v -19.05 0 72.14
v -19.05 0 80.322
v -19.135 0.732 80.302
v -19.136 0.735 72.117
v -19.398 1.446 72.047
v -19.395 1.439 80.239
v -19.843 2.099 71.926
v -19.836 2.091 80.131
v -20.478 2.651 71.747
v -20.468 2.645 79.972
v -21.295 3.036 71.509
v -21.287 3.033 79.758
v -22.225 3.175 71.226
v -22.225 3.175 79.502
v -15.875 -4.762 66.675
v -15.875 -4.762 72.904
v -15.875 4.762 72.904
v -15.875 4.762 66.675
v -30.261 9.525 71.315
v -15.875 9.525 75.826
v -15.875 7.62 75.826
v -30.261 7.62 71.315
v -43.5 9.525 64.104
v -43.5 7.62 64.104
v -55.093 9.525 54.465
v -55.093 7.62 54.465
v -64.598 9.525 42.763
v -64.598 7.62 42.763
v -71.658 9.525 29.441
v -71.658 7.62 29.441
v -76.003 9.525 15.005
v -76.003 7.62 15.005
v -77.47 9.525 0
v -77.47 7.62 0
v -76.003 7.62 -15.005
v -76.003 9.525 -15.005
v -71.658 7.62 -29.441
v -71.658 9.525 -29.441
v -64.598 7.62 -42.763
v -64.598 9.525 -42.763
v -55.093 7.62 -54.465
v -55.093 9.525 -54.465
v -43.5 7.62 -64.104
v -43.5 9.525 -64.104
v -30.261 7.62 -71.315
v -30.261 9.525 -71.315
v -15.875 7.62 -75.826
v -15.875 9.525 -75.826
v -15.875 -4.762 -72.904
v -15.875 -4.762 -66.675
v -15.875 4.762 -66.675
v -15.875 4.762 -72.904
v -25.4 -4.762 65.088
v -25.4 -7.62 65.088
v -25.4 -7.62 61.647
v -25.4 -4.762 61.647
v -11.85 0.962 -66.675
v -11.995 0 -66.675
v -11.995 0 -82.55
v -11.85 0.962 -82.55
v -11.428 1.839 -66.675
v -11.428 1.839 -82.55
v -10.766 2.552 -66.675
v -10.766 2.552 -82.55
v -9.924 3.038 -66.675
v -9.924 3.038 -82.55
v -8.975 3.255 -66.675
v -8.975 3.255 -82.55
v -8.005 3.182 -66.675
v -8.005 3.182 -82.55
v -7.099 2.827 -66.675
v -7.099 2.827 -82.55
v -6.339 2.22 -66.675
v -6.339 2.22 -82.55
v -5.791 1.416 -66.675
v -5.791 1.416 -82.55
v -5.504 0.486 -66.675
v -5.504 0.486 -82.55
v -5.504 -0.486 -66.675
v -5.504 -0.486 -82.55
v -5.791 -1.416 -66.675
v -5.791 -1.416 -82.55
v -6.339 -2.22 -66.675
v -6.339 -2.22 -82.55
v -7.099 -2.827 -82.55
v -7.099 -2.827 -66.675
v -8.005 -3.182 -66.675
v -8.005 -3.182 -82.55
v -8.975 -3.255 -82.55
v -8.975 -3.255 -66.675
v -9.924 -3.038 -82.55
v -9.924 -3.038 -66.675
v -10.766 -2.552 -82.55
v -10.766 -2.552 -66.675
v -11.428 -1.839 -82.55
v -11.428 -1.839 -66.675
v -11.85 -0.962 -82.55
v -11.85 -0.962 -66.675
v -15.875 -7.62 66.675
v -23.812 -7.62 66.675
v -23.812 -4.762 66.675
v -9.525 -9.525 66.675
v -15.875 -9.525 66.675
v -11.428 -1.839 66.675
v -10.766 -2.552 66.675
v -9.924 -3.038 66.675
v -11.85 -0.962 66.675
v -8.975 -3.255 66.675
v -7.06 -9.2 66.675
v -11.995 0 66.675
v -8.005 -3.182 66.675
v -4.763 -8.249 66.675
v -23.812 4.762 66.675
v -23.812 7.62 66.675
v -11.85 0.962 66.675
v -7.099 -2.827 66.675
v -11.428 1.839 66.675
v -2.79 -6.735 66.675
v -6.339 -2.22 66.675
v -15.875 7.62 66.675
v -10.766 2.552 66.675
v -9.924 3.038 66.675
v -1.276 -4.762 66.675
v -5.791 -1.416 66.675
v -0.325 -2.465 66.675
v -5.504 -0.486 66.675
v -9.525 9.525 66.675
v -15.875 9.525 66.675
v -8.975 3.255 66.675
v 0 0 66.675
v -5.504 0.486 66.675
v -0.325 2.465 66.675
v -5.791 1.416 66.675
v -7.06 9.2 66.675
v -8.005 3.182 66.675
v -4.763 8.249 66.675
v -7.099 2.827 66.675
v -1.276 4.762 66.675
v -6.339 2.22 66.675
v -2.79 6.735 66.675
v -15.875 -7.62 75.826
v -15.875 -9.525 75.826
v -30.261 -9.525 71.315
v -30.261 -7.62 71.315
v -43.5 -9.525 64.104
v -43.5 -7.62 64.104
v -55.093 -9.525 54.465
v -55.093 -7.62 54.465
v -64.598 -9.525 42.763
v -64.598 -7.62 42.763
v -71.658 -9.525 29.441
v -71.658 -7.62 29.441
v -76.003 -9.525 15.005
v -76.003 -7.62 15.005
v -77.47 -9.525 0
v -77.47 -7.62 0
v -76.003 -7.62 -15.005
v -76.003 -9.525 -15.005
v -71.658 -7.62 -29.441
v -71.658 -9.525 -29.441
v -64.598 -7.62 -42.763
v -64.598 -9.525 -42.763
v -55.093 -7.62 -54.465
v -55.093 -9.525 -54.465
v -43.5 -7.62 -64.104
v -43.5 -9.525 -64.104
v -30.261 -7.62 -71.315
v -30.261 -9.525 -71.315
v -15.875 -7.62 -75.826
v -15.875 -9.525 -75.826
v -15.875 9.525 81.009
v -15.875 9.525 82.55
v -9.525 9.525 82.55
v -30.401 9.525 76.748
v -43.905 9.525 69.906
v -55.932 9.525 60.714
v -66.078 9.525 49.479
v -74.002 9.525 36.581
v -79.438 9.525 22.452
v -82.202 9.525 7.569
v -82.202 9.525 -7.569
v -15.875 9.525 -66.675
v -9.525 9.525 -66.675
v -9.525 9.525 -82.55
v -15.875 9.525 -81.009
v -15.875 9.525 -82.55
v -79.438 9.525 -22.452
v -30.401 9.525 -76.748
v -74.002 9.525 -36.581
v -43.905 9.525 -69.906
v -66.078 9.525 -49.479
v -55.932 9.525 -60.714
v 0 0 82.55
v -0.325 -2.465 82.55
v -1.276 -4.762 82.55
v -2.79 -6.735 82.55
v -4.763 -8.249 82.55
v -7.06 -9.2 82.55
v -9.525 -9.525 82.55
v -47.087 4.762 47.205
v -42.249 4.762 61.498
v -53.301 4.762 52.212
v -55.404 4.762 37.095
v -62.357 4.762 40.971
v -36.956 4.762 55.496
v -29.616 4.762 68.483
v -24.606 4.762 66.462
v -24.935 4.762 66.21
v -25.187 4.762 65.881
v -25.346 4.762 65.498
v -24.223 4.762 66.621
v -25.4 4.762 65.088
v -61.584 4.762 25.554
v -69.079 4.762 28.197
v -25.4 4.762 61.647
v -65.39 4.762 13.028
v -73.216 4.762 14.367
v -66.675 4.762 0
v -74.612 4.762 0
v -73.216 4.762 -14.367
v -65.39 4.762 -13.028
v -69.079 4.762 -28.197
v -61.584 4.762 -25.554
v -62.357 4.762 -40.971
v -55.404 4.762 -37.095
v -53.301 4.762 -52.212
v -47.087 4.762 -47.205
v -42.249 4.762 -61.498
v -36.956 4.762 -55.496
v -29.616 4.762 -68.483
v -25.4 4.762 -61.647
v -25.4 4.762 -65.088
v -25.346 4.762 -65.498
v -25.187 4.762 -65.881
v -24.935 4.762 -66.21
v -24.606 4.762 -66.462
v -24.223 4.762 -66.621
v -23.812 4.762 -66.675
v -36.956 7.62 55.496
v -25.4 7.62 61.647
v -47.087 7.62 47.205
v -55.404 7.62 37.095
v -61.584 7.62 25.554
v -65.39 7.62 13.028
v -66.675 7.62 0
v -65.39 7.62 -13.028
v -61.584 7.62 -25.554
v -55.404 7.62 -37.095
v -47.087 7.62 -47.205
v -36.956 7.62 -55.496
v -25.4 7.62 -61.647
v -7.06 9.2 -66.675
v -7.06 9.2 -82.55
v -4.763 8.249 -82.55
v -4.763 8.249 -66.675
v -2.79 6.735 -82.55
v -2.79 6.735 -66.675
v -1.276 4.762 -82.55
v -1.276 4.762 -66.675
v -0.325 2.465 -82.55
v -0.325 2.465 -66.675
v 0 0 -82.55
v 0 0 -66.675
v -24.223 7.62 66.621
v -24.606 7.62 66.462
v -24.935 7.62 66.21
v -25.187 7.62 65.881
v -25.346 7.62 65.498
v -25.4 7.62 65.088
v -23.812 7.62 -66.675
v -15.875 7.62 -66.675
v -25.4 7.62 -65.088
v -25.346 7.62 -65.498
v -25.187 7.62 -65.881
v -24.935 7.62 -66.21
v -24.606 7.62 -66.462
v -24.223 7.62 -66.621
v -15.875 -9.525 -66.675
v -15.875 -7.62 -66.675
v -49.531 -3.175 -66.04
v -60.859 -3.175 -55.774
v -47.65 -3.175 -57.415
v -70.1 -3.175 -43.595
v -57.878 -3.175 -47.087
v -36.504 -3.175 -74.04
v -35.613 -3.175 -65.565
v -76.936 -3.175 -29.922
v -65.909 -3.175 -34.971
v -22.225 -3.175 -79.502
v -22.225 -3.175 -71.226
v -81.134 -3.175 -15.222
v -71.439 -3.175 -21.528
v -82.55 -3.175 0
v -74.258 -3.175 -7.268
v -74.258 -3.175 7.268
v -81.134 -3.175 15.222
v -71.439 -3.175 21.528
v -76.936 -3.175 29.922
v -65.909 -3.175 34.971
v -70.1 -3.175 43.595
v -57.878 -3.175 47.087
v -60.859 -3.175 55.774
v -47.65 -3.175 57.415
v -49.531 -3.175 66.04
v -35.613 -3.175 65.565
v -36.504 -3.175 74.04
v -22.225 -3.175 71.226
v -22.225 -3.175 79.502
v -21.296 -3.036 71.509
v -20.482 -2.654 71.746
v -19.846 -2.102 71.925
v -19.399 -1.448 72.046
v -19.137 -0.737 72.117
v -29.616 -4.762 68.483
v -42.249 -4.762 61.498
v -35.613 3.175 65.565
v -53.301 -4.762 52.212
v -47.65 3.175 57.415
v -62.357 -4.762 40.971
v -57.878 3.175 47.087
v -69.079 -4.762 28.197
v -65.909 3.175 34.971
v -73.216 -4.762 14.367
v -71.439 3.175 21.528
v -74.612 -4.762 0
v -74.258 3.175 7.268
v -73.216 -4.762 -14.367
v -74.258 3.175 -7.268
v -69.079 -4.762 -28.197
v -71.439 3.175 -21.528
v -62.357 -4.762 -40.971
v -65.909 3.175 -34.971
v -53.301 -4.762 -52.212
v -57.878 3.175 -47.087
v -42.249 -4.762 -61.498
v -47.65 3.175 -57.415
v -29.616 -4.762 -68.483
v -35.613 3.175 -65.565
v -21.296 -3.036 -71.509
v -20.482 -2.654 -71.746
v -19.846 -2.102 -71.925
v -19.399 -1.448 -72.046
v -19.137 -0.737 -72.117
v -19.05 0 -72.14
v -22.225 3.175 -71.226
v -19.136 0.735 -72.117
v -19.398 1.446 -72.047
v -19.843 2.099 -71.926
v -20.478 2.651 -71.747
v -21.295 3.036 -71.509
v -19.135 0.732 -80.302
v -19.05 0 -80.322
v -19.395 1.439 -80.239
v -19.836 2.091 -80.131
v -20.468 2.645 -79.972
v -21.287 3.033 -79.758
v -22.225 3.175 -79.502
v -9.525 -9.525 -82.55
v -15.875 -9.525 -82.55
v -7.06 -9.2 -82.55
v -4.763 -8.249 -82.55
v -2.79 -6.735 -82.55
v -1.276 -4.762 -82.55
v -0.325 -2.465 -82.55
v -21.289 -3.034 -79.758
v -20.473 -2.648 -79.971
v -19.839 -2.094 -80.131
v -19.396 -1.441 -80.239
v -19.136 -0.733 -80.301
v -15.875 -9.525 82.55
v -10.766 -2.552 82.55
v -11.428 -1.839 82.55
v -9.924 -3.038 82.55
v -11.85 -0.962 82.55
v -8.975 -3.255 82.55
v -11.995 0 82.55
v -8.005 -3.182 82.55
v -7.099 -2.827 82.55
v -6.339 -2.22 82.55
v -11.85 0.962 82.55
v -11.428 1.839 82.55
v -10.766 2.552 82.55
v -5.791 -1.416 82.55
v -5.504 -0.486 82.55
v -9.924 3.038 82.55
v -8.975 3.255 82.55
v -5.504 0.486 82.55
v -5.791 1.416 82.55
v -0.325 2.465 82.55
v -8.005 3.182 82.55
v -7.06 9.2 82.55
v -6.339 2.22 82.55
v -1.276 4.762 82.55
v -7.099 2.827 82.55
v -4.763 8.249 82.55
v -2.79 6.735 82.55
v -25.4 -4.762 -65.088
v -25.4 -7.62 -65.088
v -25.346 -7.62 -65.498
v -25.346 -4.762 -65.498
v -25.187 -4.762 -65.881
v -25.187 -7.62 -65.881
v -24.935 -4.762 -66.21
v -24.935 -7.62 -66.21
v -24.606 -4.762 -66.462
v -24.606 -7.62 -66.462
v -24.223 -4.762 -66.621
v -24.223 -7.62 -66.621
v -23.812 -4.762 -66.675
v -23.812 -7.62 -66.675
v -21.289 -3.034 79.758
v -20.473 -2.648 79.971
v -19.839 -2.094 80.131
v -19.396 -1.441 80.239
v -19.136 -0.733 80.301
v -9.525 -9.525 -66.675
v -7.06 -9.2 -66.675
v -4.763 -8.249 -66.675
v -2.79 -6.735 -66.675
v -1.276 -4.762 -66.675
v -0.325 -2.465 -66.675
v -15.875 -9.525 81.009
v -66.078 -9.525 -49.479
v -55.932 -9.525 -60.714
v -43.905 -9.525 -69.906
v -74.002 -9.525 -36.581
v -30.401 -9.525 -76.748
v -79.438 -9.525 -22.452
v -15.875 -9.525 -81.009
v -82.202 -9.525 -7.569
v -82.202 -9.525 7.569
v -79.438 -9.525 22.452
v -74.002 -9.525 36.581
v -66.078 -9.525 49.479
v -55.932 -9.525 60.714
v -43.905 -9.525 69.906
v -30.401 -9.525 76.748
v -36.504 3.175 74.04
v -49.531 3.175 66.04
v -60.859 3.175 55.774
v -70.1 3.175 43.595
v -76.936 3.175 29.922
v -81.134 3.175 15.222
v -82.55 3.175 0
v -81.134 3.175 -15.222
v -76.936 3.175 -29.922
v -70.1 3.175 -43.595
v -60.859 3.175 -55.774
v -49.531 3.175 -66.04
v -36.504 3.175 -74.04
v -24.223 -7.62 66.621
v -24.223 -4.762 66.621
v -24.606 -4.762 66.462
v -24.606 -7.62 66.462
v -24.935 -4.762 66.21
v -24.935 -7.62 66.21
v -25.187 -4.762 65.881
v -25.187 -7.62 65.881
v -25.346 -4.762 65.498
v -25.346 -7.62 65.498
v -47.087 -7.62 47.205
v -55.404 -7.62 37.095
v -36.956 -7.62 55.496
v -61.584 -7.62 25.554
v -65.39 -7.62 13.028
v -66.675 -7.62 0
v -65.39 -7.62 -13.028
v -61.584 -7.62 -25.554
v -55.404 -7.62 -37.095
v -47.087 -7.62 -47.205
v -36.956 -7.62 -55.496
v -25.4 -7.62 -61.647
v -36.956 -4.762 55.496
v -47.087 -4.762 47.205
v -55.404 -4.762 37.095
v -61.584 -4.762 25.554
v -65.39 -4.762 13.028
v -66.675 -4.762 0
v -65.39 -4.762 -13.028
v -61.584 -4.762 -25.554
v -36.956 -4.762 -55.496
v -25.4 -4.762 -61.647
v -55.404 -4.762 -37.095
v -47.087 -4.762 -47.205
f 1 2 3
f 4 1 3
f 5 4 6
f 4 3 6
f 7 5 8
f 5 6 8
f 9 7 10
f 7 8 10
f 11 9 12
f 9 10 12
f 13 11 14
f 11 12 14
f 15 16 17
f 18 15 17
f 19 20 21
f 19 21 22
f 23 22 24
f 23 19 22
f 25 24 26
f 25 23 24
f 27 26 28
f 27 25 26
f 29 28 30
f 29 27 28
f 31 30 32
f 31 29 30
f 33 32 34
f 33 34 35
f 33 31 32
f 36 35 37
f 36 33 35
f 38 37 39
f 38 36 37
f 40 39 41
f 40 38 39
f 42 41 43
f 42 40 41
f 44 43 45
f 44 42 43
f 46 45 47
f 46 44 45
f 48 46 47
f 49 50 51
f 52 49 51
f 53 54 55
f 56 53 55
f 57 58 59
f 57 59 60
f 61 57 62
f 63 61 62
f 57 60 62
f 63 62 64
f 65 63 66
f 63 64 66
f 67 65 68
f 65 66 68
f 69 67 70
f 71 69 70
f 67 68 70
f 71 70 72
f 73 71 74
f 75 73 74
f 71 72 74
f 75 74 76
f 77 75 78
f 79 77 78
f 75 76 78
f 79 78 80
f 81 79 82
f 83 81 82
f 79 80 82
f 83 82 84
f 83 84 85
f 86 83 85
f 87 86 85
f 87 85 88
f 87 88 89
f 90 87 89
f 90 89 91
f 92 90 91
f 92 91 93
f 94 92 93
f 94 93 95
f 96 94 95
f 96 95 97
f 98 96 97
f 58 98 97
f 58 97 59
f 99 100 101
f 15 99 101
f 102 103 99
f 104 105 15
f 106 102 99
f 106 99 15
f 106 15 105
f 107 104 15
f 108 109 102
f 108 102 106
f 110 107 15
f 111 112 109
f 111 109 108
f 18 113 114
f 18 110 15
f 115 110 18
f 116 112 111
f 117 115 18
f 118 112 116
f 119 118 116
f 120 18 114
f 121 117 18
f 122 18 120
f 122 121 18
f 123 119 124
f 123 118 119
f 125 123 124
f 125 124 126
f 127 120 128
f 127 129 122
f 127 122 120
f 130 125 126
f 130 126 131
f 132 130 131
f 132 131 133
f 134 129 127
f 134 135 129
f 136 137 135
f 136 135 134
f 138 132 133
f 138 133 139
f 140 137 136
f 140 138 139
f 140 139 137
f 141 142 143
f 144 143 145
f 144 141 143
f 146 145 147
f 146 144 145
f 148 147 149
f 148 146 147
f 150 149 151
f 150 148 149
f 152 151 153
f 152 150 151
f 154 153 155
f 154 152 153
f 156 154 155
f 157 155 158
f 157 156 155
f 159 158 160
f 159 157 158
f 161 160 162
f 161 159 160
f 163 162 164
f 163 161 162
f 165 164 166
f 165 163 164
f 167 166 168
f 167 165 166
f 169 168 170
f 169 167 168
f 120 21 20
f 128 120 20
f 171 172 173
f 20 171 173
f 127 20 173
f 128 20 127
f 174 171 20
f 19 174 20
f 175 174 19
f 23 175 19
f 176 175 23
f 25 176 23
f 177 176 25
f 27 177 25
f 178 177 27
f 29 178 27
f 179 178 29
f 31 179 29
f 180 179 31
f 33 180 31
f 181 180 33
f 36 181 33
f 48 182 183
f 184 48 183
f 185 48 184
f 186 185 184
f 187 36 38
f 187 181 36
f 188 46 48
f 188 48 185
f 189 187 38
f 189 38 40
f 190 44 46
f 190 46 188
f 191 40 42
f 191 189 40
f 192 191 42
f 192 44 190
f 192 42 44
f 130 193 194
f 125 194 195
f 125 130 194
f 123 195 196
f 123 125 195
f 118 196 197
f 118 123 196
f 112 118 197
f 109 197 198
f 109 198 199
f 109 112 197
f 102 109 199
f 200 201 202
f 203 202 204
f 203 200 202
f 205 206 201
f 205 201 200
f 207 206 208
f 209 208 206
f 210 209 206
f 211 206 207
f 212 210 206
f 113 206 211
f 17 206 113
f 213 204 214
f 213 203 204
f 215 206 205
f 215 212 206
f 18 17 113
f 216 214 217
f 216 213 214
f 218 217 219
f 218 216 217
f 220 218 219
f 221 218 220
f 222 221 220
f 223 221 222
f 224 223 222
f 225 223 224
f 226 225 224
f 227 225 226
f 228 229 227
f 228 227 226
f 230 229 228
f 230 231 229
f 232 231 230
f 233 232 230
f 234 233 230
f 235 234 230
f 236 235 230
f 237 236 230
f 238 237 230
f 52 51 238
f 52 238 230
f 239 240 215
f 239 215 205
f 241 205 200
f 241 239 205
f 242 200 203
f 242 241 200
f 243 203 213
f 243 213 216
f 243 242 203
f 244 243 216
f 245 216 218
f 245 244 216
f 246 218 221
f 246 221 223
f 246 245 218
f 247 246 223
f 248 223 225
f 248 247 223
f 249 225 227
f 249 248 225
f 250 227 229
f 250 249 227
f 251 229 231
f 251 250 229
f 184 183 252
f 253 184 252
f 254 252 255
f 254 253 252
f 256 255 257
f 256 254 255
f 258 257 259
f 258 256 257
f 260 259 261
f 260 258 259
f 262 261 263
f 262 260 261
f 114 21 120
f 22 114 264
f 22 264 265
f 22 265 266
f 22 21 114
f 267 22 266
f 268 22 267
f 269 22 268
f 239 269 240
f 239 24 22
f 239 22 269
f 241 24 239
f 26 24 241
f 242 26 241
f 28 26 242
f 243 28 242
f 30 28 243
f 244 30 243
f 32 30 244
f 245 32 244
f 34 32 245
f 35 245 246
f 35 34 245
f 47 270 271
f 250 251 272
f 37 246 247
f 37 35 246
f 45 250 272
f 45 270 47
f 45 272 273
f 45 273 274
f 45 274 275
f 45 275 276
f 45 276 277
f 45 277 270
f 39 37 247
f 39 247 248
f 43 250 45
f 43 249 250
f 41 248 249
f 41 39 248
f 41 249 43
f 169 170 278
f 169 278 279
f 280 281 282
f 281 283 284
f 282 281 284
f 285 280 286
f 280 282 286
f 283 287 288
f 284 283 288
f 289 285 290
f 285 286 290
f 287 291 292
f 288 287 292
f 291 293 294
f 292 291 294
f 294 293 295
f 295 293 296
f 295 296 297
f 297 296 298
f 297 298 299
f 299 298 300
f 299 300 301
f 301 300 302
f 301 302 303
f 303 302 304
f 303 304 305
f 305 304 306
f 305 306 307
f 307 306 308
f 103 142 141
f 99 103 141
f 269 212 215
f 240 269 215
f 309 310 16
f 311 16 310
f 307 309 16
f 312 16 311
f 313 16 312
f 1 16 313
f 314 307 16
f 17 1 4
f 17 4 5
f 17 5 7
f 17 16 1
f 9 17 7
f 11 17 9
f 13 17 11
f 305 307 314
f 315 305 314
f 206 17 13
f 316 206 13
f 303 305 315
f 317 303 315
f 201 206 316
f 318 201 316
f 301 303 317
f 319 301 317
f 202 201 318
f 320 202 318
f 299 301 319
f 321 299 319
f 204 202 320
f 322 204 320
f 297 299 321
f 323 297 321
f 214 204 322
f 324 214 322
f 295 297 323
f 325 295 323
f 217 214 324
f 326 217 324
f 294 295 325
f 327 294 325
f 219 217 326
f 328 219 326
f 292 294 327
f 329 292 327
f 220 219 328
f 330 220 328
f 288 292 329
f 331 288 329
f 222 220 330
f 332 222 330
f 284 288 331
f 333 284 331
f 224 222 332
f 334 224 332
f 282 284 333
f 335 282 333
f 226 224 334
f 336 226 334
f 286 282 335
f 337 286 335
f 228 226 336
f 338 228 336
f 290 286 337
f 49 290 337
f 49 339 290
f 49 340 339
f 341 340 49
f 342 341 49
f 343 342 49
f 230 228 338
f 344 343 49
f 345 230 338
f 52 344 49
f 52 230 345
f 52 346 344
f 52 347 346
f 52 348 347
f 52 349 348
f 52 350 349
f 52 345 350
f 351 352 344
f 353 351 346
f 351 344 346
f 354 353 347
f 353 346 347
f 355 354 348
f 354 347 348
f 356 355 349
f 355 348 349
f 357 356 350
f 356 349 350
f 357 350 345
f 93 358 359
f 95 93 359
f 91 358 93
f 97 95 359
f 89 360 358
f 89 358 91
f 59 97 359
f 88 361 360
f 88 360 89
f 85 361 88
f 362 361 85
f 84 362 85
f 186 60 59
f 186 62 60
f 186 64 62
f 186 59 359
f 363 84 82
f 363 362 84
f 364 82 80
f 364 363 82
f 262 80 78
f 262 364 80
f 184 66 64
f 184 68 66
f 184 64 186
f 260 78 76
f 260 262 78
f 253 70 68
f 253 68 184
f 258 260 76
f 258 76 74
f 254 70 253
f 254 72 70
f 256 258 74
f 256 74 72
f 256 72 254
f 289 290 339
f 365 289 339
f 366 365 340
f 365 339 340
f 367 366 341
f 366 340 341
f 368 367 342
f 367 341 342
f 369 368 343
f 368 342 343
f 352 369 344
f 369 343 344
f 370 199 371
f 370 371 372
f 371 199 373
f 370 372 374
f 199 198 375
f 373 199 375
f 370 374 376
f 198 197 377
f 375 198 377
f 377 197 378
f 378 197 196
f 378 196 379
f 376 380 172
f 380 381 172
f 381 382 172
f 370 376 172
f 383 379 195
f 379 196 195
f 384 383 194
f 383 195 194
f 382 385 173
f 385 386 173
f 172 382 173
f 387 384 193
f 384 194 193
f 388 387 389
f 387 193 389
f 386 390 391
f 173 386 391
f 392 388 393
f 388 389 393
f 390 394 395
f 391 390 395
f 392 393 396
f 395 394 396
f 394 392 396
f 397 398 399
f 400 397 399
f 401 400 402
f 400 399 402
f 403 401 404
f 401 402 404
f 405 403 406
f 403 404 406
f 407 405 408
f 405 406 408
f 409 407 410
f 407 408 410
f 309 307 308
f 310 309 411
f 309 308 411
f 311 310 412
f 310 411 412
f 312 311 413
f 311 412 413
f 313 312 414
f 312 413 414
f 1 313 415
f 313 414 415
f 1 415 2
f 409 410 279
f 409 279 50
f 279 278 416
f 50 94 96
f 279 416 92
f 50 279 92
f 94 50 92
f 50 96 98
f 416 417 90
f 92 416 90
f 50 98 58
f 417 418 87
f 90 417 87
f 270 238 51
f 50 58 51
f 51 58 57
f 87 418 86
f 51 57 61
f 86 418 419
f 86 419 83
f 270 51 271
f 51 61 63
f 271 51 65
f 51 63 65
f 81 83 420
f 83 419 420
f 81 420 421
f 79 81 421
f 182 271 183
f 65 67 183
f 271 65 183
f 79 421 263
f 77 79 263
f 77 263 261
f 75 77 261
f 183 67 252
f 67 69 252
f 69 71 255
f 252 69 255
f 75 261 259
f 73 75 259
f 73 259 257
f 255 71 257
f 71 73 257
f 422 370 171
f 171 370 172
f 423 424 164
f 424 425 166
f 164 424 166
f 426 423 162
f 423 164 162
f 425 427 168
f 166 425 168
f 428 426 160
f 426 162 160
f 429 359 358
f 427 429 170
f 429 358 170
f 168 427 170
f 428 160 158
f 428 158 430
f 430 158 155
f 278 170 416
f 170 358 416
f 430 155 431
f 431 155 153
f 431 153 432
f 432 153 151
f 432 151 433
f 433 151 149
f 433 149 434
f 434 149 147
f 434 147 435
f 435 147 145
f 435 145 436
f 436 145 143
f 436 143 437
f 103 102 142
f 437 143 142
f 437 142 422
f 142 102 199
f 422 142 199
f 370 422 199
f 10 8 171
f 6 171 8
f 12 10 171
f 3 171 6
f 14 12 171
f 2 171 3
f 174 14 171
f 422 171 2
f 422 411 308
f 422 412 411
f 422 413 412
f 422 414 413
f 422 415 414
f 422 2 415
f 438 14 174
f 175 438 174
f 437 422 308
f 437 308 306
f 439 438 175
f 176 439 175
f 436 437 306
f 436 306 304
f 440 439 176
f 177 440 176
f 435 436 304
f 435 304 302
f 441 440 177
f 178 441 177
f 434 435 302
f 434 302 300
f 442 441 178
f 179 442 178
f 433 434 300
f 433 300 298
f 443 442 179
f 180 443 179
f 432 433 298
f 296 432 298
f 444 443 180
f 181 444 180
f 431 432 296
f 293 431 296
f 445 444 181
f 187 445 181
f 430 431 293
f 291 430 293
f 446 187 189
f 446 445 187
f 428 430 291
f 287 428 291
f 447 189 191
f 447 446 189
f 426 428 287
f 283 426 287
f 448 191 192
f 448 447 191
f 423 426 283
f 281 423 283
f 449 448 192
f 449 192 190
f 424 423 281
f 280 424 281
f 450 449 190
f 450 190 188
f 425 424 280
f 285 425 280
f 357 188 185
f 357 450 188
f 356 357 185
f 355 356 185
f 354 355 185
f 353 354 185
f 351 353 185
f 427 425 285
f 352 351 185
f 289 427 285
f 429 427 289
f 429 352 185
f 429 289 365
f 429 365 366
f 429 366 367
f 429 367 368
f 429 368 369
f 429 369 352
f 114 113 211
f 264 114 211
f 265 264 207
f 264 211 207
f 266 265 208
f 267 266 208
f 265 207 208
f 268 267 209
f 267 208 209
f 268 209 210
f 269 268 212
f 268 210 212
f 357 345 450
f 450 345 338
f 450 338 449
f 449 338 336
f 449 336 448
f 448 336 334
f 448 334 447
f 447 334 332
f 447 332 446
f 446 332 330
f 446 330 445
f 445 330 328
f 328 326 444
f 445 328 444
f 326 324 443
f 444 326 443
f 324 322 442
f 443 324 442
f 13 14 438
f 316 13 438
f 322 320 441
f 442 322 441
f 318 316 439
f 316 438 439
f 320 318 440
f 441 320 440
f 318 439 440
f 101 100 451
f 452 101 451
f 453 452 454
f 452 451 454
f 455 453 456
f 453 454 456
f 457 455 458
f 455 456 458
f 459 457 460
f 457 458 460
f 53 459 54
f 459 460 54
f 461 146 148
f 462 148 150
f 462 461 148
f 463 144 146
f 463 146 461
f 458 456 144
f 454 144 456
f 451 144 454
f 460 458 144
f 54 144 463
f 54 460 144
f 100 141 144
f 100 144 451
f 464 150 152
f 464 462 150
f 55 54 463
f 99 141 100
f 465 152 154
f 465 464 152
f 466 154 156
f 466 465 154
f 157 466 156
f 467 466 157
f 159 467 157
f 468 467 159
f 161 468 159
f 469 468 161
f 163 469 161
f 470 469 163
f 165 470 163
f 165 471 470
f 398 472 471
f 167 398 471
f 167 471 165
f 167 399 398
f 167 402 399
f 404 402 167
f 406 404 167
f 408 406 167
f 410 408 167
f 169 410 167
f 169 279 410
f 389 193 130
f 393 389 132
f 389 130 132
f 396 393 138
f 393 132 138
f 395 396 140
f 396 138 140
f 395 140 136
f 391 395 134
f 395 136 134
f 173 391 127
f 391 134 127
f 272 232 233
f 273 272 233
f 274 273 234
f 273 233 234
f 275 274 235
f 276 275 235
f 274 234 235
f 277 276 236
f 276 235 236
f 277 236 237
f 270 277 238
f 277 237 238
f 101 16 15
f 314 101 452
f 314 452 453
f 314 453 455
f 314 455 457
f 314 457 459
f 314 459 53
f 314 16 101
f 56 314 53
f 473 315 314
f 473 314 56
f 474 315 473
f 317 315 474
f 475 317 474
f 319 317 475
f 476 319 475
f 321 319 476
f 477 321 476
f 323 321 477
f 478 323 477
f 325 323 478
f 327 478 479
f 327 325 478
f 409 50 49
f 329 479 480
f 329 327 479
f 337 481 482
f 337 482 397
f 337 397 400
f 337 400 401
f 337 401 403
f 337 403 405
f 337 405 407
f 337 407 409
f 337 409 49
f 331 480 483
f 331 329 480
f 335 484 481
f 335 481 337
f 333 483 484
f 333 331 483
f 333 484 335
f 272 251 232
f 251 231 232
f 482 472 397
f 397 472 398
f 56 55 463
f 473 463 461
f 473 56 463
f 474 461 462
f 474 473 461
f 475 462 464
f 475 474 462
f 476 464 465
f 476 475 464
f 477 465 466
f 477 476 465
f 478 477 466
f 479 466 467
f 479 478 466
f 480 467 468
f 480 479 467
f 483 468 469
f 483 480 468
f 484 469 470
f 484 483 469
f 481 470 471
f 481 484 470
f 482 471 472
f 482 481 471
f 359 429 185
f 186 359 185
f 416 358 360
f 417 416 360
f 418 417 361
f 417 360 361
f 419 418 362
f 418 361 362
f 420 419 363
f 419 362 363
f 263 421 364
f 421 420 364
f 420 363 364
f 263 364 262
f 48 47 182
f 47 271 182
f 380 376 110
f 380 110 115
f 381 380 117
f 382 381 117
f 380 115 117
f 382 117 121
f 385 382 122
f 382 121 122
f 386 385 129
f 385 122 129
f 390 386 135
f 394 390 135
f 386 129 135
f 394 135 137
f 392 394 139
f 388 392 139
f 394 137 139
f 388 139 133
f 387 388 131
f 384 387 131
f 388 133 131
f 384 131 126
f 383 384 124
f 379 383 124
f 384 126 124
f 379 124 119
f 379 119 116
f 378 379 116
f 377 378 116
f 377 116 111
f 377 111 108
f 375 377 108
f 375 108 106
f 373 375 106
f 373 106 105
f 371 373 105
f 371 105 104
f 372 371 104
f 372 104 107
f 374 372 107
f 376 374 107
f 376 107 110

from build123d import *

# Parameters (mm, degrees)
F3_W        = 19.05
F3_H        = 15.875
F4_DEPTH    = 15.875
F6_D        = 6.5278
F8_DEPTH    = 165.101
F9_T1_DEPTH = 63.5
F9_T3_DEPTH = 63.5
F11_DEPTH   = 17.1460001


# Not quite as in the source:
# - a fillet or chamfer that OpenCascade refuses, or shapes differently, is made with other operations: its cross-section is extruded or revolved along the edge and cut away or added


with BuildPart() as f2:
    # F2: sweep along a path in F0
    with BuildLine(Plane.XZ) as f2_path:
        ThreePointArc((0, 76.2), (-76.2, 0), (0, -76.2))
    # F1 (on Right) → F2 (sweep)
    with BuildSketch(Plane.YZ):
        Polygon((9.525, 82.55), (0, 82.55), (-9.525, 82.55), (-9.525, 77.47), (-7.62, 77.47), (-7.62, 66.675), (-4.7625, 66.675), (-4.7625, 74.6125), (0, 74.6125), (4.7625, 74.6125), (4.7625, 66.675), (7.62, 66.675), (7.62, 77.47), (9.525, 77.47), align=None)
    sweep(path=f2_path.line)

    # F3 (on face) → F4 (join)
    with BuildSketch(Plane.YZ):
        with Locations((0, 74.6125)):
            Rectangle(F3_W, F3_H)
        with Locations((0, -74.6125)):
            Rectangle(F3_W, F3_H)
    extrude(amount=-F4_DEPTH)

    # F6 (through all)
    with Locations(Plane.XY.offset(82.55)):
        with Locations((-8.73125, 0)):
            Hole(F6_D / 2)

    # F7 (on face) → F8 (cut, through all)
    with BuildSketch(Plane.XY.offset(82.55)):
        with BuildLine():
            Line((-22.225, 3.175), (-114.3, 3.175))
            Line((-114.3, 3.175), (-114.3, -3.175))
            Line((-114.3, -3.175), (-22.225, -3.175))
            ThreePointArc((-22.225, -3.175), (-19.9799359697, -2.2450640303), (-19.05, 0))
            ThreePointArc((-19.05, 0), (-19.9799359697, 2.2450640303), (-22.225, 3.175))
        make_face()
    extrude(amount=-F8_DEPTH, mode=Mode.SUBTRACT)

    # F9: fillet of radius 9.525 on 4 edges, made by hand

    # F9_s2 → F9_t1 (cut)
    with BuildSketch(Plane.XY.offset(42.8625)):
        with BuildLine():
            ThreePointArc((0, 0), (-2.7898079092, -6.7351920908), (-9.525, -9.525))
            Line((-9.525, -9.525), (0, -9.525))
            Line((0, -9.525), (0, 0))
        make_face()
        with BuildLine():
            ThreePointArc((0, 0), (-2.7898079092, 6.7351920908), (-9.525, 9.525))
            Line((-9.525, 9.525), (0, 9.525))
            Line((0, 9.525), (0, 0))
        make_face()
    extrude(amount=F9_T1_DEPTH, mode=Mode.SUBTRACT)

    # F9_s4 → F9_t3 (cut)
    with BuildSketch(Plane.XY.offset(-106.3625)):
        with BuildLine():
            ThreePointArc((-9.525, -9.525), (-2.7898079092, -6.7351920908), (0, 0))
            Line((0, 0), (0, -9.525))
            Line((0, -9.525), (-9.525, -9.525))
        make_face()
        with BuildLine():
            ThreePointArc((-9.525, 9.525), (-2.7898079092, 6.7351920908), (0, 0))
            Line((0, 0), (0, 9.525))
            Line((0, 9.525), (-9.525, 9.525))
        make_face()
    extrude(amount=F9_T3_DEPTH, mode=Mode.SUBTRACT)

    # F10 (on face) → F11 (cut, through all)
    with BuildSketch(Plane.XZ.offset(7.62)):
        with BuildLine():
            Line((0, 60.325), (0, 66.675))
            Line((0, 66.675), (-23.8125, 66.675))
            ThreePointArc((-23.8125, 66.675), (-24.9350320151, 66.2100320151), (-25.4, 65.0875))
            Line((-25.4, 65.0875), (-25.4, 60.325))
            Line((-25.4, 60.325), (0, 60.325))
        make_face()
        with BuildLine():
            Line((-23.8125, -66.675), (0, -66.675))
            Line((0, -66.675), (0, -60.325))
            Line((0, -60.325), (-25.4, -60.325))
            Line((-25.4, -60.325), (-25.4, -65.0875))
            ThreePointArc((-25.4, -65.0875), (-24.9350320151, -66.2100320151), (-23.8125, -66.675))
        make_face()
    extrude(amount=-F11_DEPTH, mode=Mode.SUBTRACT)


solid = f2.part
